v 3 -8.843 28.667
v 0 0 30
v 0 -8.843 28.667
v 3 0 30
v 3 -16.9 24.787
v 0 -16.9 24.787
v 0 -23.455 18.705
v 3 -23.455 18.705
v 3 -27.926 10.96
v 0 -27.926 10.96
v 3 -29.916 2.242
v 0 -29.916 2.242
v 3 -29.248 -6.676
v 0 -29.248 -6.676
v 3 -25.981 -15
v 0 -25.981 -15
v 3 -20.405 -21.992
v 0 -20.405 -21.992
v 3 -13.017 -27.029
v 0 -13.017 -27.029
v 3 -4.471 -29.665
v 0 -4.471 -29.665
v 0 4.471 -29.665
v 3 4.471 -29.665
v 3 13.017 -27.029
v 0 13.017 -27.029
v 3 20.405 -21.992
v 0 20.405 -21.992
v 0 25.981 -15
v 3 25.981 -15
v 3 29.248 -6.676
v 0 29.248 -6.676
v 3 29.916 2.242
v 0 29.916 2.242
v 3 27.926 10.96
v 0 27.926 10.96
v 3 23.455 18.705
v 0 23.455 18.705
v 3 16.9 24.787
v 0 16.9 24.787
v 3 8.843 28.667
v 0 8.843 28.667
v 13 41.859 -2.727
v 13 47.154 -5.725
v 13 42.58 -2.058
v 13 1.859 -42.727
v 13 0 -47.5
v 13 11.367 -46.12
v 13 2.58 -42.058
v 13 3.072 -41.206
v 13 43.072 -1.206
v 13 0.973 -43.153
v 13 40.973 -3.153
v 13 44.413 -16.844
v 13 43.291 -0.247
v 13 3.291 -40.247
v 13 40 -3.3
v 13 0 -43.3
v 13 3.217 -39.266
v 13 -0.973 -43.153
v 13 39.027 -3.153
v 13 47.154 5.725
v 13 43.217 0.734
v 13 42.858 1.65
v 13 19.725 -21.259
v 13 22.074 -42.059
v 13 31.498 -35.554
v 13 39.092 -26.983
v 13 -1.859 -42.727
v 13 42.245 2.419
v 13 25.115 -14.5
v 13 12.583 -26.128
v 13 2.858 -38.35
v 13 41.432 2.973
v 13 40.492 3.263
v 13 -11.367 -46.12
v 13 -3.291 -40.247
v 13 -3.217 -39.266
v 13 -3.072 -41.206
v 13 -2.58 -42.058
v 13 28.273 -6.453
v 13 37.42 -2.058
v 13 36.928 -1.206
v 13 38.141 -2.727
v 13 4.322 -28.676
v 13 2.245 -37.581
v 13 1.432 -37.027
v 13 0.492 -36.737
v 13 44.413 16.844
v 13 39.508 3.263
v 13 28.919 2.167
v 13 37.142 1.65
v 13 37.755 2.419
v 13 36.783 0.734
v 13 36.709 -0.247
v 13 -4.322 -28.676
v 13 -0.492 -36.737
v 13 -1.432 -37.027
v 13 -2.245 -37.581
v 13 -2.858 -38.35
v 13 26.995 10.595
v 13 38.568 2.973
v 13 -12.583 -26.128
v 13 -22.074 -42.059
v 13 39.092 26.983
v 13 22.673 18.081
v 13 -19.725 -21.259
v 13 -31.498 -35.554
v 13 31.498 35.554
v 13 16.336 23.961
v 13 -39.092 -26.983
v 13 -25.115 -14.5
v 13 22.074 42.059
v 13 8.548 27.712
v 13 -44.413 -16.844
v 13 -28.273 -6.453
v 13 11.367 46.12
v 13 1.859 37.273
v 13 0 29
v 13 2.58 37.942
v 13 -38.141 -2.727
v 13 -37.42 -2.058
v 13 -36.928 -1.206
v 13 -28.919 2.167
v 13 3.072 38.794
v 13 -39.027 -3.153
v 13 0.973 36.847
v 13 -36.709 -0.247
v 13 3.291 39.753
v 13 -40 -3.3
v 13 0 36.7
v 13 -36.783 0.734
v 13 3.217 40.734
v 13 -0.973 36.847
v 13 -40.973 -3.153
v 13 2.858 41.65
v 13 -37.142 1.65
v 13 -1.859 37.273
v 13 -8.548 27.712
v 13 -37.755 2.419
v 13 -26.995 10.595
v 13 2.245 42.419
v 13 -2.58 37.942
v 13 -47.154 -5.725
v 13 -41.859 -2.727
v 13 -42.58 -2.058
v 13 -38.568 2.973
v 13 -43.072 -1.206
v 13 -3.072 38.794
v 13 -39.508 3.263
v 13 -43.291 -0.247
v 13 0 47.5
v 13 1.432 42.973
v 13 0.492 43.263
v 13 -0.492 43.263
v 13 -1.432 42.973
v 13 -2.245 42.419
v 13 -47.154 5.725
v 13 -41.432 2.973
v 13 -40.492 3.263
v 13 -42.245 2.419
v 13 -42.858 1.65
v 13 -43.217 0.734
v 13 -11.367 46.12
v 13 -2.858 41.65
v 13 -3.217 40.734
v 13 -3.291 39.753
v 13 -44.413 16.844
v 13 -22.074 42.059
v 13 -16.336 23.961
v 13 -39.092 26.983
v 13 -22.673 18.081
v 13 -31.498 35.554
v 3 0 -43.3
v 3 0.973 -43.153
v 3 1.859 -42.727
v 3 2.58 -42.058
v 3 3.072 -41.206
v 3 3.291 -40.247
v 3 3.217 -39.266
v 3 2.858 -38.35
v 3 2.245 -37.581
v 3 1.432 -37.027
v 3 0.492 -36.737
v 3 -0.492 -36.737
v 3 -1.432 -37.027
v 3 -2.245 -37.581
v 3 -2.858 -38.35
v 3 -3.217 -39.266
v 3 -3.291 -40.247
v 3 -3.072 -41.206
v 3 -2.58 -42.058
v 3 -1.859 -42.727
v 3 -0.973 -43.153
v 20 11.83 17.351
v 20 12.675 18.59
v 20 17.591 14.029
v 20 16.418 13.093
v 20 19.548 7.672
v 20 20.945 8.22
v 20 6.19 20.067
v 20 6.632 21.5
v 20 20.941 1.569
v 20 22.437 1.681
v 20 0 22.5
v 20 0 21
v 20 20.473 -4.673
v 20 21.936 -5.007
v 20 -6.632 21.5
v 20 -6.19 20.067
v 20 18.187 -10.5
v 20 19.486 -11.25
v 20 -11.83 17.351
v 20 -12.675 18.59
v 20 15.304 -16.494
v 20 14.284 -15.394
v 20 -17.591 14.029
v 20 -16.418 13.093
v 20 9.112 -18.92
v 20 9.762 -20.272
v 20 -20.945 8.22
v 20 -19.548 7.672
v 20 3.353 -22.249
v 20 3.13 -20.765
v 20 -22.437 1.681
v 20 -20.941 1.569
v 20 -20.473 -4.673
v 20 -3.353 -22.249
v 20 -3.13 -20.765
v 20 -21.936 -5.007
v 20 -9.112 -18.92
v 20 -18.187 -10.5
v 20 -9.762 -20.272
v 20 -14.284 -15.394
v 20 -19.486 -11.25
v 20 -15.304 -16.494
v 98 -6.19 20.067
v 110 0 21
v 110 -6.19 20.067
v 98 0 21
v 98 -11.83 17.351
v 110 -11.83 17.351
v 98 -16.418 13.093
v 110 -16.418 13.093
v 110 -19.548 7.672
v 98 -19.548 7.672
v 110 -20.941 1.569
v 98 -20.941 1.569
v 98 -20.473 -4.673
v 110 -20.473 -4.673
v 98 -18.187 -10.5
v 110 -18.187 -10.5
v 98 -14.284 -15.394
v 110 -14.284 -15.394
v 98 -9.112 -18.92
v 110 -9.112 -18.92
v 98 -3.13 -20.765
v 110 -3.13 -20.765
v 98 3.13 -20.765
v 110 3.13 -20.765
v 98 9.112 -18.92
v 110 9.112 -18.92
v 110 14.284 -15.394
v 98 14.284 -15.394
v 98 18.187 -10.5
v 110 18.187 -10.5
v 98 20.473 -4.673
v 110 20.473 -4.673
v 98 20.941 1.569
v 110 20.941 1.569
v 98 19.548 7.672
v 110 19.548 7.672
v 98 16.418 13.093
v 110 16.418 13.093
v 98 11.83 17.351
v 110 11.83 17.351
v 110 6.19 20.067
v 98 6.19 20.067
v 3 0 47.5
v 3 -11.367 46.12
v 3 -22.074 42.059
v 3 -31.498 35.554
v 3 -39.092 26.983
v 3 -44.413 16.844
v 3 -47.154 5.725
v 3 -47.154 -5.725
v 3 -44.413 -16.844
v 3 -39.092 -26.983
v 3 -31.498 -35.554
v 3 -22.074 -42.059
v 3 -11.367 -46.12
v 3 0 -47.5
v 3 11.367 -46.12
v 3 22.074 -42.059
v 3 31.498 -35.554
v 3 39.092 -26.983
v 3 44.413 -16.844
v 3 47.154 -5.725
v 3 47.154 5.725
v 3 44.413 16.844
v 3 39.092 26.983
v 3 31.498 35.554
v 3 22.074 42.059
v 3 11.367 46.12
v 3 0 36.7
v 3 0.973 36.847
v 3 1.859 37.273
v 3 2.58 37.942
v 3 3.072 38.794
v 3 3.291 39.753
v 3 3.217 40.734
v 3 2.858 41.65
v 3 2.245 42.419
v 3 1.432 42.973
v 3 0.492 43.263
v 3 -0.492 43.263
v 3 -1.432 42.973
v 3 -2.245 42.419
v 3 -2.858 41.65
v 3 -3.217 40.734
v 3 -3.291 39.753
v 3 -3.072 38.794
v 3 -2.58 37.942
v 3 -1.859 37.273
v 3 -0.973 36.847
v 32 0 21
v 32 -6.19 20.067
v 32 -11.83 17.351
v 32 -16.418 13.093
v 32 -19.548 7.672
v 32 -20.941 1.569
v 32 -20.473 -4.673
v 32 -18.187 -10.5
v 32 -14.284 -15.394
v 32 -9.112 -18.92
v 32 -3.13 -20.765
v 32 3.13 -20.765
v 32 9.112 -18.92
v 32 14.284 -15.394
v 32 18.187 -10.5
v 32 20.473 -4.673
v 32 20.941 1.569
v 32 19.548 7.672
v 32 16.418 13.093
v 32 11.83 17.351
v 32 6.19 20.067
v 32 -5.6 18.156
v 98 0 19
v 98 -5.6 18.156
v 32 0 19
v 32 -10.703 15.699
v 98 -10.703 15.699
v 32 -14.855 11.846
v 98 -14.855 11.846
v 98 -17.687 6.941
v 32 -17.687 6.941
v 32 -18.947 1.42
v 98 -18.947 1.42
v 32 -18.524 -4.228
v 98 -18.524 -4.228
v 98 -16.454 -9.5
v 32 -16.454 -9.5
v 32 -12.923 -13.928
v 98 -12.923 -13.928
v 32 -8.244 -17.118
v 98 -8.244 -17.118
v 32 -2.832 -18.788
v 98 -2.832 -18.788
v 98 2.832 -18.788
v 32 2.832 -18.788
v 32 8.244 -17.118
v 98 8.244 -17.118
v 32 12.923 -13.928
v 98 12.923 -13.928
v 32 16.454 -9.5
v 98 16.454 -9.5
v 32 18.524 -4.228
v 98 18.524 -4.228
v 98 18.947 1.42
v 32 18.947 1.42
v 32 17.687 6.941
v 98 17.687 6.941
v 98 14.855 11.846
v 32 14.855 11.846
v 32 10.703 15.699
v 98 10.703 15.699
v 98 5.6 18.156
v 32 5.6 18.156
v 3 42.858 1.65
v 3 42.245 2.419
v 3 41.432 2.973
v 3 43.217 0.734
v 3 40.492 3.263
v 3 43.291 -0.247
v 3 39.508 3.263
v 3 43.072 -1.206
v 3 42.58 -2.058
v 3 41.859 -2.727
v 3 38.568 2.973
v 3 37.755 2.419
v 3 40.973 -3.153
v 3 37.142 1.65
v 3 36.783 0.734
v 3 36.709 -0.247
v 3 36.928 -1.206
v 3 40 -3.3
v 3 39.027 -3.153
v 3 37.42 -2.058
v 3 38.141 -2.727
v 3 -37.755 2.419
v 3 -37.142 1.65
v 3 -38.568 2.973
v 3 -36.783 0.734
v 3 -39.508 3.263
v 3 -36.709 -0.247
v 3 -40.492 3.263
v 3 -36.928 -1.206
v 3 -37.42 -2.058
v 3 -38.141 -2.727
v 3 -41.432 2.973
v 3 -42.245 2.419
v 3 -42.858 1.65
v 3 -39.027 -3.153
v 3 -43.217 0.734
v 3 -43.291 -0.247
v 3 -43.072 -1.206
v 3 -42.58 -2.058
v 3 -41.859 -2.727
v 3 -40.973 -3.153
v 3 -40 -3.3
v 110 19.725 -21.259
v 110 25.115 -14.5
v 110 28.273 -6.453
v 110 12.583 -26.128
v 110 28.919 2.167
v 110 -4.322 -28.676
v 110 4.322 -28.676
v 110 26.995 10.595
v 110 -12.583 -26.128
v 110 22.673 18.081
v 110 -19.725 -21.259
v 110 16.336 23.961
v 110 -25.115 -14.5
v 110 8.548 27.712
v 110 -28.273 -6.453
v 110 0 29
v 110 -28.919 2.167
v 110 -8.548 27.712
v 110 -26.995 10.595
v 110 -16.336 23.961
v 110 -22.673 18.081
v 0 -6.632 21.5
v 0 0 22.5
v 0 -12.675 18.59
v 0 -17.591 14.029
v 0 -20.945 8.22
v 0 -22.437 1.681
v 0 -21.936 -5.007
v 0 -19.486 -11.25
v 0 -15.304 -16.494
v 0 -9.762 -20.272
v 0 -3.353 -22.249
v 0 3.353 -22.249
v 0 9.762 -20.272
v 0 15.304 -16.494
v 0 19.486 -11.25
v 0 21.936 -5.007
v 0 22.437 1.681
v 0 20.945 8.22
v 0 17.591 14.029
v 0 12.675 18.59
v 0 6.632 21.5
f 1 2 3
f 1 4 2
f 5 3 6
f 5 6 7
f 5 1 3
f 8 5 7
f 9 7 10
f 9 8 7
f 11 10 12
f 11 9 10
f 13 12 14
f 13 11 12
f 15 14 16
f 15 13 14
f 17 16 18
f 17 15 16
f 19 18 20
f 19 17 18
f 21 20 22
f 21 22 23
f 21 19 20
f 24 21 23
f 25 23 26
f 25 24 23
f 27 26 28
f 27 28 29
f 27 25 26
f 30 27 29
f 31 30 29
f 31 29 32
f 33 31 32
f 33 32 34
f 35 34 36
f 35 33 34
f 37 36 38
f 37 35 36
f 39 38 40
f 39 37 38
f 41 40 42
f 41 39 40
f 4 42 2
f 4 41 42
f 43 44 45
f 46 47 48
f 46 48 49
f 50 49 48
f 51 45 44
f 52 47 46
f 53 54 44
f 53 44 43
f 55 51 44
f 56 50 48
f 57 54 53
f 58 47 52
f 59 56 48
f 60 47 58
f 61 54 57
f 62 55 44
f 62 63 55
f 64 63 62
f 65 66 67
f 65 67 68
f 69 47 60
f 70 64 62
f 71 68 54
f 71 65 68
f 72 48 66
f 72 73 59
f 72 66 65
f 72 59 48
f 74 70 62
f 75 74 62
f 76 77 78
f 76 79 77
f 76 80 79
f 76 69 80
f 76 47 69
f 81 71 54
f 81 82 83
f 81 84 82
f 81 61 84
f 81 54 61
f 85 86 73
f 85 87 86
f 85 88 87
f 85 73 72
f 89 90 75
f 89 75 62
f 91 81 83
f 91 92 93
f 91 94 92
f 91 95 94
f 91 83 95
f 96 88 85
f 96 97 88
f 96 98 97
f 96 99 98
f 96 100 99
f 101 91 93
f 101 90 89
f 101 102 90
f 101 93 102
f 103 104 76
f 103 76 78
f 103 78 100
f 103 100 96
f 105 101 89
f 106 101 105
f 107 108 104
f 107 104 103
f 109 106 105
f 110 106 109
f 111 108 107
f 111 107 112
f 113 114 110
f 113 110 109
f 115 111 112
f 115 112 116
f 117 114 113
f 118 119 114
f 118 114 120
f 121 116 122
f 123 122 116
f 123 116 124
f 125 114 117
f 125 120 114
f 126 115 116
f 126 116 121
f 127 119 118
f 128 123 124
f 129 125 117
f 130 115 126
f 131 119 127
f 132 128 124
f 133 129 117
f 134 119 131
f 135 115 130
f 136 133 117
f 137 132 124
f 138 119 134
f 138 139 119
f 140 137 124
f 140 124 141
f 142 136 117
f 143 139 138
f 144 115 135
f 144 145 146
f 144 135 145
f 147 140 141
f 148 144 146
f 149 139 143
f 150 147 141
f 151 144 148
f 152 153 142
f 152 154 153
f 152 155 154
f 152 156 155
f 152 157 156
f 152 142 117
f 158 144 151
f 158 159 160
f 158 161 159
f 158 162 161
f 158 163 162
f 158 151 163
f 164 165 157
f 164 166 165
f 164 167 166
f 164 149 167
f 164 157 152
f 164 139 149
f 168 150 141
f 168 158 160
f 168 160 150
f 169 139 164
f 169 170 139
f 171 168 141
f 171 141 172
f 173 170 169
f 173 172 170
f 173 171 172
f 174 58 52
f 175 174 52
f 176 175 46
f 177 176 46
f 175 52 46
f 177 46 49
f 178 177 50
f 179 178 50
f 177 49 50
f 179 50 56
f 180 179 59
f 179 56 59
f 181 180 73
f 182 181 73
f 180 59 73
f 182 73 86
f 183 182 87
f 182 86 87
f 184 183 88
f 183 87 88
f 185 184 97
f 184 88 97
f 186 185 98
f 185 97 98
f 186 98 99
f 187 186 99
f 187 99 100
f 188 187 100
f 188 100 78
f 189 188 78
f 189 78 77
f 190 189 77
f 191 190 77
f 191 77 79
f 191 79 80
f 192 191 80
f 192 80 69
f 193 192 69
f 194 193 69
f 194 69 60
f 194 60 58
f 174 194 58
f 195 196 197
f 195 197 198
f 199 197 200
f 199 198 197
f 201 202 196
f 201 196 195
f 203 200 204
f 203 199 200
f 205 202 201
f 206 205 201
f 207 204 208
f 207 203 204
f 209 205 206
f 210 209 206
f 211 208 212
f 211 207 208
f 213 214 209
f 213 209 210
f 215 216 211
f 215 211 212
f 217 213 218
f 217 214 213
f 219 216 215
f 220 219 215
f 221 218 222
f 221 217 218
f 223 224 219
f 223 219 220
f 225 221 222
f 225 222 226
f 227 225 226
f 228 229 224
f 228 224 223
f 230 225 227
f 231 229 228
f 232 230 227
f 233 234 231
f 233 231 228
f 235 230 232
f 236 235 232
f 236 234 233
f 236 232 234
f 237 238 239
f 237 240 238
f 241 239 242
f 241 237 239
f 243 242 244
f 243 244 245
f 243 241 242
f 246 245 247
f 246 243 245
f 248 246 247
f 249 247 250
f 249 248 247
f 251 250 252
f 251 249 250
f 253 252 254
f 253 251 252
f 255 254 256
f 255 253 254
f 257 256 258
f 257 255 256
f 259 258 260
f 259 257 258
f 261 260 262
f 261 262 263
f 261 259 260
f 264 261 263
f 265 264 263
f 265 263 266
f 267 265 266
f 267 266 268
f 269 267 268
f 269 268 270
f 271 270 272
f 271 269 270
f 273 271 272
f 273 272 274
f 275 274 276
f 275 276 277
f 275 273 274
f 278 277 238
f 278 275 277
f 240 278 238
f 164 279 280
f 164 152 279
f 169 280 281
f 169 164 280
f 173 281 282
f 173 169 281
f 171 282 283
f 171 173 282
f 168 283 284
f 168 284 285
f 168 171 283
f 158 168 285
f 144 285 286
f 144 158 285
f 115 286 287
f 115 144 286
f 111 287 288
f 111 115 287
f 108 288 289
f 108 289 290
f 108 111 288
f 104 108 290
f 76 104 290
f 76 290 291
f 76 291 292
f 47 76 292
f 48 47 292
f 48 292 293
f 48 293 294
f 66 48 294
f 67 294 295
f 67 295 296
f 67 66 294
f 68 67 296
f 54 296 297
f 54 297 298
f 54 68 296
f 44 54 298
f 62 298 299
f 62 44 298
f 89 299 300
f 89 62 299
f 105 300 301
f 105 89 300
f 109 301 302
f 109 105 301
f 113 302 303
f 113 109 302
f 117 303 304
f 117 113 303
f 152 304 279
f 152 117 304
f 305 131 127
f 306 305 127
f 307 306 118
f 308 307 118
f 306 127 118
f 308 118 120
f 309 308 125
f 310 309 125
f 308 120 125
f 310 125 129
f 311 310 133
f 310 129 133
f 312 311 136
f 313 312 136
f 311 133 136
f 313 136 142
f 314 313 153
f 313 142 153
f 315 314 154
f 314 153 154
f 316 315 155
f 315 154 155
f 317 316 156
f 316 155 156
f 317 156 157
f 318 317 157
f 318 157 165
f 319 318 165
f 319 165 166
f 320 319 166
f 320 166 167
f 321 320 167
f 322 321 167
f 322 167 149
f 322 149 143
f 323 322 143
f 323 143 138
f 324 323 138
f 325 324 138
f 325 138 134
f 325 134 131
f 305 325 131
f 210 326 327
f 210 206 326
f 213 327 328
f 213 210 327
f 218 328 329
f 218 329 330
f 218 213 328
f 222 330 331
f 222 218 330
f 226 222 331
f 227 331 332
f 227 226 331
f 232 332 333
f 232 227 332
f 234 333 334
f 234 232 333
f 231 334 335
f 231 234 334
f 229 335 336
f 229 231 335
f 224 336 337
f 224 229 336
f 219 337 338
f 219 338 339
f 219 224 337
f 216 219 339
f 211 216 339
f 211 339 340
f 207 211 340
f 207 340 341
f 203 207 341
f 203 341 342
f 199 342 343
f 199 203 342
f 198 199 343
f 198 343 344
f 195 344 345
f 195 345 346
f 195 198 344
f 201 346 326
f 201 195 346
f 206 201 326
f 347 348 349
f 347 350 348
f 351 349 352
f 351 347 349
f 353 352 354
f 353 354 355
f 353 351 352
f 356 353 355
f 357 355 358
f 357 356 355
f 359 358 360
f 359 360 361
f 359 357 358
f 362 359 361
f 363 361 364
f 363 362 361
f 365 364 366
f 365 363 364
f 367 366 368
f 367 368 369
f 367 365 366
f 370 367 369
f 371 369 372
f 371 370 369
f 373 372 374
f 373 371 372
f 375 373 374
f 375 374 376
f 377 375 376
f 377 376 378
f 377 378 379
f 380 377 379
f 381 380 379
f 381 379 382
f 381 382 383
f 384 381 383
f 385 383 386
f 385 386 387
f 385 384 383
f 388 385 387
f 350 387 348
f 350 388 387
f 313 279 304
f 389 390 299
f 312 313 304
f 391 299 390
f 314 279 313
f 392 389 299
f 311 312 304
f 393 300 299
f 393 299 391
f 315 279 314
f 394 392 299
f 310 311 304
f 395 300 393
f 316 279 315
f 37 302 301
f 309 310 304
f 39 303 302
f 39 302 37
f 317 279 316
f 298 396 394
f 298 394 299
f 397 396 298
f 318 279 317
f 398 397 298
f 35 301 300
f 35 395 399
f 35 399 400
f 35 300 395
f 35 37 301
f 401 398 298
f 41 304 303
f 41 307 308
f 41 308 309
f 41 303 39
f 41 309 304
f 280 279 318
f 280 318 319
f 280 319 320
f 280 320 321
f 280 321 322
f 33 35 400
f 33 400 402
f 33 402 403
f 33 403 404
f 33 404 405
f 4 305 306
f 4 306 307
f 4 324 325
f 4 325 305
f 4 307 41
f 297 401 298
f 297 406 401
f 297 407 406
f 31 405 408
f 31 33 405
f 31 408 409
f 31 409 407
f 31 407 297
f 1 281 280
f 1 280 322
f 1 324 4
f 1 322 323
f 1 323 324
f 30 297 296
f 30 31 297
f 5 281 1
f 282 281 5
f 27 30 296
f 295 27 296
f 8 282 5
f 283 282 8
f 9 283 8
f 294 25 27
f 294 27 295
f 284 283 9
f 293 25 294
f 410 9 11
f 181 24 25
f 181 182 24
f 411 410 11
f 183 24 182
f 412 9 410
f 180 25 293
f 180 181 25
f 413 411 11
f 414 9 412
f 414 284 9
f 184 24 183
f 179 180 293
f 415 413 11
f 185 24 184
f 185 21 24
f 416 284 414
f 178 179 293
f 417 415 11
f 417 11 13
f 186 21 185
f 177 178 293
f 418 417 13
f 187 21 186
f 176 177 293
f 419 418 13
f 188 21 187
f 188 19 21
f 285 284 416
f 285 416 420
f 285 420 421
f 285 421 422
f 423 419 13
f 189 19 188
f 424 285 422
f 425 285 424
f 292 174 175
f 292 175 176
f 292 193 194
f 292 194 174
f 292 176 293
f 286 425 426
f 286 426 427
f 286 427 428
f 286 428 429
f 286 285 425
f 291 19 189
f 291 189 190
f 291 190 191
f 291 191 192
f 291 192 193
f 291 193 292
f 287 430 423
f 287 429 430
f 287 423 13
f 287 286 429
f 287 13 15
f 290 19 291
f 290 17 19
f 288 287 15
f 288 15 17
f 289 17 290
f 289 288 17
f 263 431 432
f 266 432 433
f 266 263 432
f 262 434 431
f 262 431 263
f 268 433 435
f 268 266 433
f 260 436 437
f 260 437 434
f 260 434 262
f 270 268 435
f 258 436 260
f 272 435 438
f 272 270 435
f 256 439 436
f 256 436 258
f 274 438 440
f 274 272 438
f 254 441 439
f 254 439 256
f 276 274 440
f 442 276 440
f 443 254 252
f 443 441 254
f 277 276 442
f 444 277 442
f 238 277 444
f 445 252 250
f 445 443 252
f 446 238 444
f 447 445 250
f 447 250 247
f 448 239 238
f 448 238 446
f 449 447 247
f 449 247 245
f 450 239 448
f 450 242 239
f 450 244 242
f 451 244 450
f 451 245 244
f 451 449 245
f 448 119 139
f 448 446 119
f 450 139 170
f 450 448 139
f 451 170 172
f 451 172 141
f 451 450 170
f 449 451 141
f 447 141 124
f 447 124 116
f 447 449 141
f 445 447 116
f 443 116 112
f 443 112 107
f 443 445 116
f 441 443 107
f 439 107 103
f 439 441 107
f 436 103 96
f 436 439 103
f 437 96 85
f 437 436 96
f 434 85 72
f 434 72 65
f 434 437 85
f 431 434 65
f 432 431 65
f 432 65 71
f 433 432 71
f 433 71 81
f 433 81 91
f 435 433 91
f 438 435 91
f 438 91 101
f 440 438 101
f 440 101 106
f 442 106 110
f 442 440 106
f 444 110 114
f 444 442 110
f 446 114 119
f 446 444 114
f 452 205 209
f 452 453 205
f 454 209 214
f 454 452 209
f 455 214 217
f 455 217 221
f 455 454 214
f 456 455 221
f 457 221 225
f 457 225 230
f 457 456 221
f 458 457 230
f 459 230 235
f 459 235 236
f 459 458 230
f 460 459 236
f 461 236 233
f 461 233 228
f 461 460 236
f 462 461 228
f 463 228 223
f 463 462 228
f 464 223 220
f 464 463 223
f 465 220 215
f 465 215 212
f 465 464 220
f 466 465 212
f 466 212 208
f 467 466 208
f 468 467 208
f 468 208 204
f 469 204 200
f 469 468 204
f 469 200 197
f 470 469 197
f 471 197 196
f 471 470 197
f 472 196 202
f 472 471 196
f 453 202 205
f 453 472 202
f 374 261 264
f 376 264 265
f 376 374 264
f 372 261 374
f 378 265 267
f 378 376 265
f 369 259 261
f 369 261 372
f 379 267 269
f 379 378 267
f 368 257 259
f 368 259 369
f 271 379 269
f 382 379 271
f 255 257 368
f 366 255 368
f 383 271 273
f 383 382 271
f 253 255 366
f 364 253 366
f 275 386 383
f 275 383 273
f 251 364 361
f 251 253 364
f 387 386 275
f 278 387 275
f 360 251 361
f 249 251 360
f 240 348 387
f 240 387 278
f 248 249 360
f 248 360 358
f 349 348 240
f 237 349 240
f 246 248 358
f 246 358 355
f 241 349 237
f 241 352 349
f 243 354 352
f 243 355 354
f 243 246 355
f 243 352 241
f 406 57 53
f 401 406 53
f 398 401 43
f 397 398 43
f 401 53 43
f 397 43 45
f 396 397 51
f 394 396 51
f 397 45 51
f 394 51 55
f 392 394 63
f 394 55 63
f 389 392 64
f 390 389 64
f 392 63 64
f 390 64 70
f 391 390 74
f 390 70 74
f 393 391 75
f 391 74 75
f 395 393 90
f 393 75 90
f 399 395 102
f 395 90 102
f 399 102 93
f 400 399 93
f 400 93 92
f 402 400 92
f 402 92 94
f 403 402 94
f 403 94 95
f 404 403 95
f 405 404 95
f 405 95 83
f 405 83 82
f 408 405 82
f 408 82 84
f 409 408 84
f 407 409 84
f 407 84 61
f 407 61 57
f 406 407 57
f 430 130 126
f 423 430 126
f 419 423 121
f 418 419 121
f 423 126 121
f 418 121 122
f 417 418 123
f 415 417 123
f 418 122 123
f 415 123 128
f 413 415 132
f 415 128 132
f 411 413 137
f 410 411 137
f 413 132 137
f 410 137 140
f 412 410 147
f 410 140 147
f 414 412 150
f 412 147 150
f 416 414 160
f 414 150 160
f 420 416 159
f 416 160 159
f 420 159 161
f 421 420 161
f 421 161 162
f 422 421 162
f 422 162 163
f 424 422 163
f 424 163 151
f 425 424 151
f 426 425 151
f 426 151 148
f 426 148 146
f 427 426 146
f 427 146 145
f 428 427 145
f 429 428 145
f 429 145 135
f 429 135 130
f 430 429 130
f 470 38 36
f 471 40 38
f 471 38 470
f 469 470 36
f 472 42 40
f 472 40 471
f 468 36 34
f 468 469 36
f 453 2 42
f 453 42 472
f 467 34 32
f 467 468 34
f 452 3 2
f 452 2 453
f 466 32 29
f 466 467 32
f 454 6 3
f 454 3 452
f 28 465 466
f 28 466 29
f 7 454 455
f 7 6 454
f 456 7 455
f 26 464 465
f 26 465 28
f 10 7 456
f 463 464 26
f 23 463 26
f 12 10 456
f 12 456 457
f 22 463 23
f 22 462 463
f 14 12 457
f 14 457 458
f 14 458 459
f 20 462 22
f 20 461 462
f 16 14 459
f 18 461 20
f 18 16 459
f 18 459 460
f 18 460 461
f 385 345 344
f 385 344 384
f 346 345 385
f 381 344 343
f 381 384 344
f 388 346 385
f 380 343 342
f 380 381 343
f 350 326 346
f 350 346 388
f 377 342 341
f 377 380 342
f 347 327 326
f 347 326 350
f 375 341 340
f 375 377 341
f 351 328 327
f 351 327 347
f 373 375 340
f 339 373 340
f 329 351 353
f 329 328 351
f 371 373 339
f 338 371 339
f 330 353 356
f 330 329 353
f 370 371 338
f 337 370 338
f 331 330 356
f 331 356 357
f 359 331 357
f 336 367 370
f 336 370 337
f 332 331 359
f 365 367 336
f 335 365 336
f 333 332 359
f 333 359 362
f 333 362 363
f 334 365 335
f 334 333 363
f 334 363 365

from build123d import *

# Parameters (mm, degrees)
PER_AGE1_D = 6.6


with BuildPart() as part:
    # Esquisse1 → Base-Révolution (revolve)
    with BuildSketch(Plane.XY, mode=Mode.PRIVATE) as base_r_volution_sk:
        Polygon((0, 22.5), (0, 30), (3, 30), (3, 47.5), (13, 47.5), (13, 29), (110, 29), (110, 21), (98, 21), (98, 19), (32, 19), (32, 21), (20, 21), (20, 22.5), align=None)
    revolve(base_r_volution_sk.sketch.rotate(Axis((-23.254623921, 0, 0), (1, 0, 0)), 90), axis=Axis((-23.254623921, 0, 0), (1, 0, 0)))

    # Perçage1 (through all)
    with Locations(Plane.ZY.offset(-3)):
        with Locations((0, 40), (40, 0), (-40, 0), (0, -40)):
            Hole(PER_AGE1_D / 2)


solid = part.part
